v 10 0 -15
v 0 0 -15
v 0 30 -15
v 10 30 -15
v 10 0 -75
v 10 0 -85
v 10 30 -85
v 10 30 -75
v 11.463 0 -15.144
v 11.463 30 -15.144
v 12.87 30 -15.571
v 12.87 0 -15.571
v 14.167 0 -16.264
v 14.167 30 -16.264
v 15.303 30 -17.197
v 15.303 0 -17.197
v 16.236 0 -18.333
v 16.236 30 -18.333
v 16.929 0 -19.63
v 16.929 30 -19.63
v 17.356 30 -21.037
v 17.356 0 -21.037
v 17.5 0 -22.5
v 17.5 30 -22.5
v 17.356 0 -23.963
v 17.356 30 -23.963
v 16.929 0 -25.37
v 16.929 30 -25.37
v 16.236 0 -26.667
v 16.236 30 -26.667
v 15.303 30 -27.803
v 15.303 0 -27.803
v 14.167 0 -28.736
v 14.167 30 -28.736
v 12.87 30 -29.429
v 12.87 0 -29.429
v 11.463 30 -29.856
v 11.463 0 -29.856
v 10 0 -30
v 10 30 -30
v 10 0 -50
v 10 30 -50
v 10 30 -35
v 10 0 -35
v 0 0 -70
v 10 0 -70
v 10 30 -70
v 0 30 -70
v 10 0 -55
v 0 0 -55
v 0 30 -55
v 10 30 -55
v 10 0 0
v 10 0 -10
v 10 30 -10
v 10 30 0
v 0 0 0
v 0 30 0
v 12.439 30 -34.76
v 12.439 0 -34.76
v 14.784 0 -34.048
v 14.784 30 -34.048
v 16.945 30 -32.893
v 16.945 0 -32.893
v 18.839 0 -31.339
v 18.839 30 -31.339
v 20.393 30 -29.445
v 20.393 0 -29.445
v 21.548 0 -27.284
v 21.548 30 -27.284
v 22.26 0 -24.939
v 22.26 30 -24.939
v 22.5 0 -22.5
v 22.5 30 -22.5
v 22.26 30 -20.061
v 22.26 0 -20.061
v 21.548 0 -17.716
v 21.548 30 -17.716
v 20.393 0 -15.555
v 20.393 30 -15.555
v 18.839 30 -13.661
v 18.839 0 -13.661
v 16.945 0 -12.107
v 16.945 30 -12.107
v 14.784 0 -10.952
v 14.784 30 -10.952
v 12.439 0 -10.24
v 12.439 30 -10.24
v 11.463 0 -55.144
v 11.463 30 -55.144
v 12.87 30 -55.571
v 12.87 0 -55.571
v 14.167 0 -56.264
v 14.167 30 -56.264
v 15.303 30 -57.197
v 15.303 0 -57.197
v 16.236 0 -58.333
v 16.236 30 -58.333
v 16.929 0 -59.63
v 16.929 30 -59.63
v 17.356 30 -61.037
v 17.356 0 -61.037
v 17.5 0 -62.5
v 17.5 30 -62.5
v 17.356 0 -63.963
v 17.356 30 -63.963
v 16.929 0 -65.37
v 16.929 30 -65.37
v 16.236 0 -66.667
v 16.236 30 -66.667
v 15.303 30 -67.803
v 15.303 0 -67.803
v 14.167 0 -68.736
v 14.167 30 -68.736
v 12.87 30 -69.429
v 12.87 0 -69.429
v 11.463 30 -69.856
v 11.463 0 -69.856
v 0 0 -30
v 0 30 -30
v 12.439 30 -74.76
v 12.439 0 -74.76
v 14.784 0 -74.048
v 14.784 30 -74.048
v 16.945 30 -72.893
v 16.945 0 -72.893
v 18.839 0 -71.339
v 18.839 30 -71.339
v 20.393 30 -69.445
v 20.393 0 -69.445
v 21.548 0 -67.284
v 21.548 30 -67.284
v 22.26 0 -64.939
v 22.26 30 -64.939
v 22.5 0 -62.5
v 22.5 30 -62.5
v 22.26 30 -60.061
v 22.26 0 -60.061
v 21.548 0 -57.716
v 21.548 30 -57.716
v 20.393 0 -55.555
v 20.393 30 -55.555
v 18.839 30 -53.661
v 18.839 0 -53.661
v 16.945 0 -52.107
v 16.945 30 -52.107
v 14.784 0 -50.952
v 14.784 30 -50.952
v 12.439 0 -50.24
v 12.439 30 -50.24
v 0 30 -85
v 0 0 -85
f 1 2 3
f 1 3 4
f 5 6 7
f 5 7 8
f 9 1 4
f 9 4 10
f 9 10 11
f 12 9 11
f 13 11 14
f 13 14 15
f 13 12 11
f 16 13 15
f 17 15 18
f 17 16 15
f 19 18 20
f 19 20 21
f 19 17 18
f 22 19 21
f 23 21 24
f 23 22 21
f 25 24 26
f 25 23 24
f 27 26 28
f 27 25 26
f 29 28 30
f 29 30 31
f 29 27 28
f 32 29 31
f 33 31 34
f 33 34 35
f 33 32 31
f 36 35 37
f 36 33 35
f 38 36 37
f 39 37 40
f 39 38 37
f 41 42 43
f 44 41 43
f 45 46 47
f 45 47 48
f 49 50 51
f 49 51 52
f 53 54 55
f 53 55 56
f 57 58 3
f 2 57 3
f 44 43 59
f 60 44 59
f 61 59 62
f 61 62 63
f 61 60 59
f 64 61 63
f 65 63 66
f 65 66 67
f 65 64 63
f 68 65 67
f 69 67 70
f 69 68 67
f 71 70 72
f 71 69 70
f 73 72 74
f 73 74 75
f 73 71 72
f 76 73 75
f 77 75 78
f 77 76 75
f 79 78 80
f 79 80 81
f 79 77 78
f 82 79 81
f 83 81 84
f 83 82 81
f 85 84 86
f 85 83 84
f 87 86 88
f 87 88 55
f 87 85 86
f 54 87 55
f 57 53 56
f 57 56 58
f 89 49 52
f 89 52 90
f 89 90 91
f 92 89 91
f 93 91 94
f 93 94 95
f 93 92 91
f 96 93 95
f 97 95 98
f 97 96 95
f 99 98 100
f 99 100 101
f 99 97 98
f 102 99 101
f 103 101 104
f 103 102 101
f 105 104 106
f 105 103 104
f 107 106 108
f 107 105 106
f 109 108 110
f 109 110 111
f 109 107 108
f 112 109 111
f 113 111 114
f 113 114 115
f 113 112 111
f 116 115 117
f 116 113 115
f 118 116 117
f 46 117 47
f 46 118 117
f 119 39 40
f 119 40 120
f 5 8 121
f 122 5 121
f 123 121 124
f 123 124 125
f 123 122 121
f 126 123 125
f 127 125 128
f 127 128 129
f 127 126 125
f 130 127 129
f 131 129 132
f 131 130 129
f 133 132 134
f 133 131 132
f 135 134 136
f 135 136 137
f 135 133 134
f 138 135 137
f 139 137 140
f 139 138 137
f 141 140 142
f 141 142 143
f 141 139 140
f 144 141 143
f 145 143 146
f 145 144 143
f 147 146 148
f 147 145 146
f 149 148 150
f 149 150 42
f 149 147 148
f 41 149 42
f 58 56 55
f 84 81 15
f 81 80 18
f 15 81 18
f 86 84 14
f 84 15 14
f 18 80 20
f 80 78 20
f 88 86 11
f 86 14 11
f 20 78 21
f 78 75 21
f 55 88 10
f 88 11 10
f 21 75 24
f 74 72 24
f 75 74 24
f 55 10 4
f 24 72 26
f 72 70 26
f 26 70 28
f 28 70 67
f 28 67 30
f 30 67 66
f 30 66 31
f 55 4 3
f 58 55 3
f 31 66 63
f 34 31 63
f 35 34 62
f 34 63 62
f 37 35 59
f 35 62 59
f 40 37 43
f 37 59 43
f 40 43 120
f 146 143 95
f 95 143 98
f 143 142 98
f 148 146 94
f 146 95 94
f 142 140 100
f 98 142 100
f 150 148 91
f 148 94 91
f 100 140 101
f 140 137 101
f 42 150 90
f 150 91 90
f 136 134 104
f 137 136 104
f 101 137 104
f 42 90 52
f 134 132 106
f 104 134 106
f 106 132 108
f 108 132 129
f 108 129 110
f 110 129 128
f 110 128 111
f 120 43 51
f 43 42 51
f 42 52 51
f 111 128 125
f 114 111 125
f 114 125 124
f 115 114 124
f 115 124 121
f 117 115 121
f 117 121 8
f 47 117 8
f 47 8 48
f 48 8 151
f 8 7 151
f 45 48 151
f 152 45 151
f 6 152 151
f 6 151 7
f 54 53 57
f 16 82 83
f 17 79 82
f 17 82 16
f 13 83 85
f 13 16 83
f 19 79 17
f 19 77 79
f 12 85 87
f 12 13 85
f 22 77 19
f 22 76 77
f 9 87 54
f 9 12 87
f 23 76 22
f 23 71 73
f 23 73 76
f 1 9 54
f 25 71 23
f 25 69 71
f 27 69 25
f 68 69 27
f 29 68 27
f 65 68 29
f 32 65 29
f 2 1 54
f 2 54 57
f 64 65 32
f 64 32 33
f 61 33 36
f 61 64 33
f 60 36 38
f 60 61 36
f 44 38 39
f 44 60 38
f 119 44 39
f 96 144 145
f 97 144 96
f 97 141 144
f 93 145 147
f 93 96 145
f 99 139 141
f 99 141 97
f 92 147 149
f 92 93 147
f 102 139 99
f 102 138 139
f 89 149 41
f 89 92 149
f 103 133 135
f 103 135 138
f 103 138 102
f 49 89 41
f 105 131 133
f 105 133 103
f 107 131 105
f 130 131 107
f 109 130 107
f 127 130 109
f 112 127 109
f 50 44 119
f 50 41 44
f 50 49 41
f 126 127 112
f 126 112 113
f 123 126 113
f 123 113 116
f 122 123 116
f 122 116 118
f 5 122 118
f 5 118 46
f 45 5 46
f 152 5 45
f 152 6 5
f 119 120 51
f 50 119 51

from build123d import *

# Parameters (mm, degrees)
BOSS_EXTRUDE1_DEPTH = 30


with BuildPart() as part:
    # Sketch2 → Boss-Extrude1 (new body)
    with BuildSketch(Plane(origin=(0, 0, 0), x_dir=(1, 0, 0), z_dir=(0, 1, 0))):
        with BuildLine():
            Line((0, 0), (0, 15))
            Line((0, 15), (9.999999101, 15))
            ThreePointArc((9.999999101, 15), (17.5, 22.5), (9.999999101, 30))
            Line((9.999999101, 30), (0, 30))
            Line((0, 30), (0, 55))
            Line((0, 55), (9.999999101, 55))
            ThreePointArc((9.999999101, 55), (17.5, 62.5), (9.999999101, 70))
            Line((9.999999101, 70), (0, 70))
            Line((0, 70), (0, 85))
            Line((0, 85), (10, 85))
            Line((10, 85), (10, 75))
            ThreePointArc((10, 75), (22.5, 62.5), (10, 50))
            Line((10, 50), (10, 35))
            ThreePointArc((10, 35), (22.5, 22.5), (10, 10))
            Line((10, 10), (10, 0))
            Line((10, 0), (0, 0))
        make_face()
    extrude(amount=BOSS_EXTRUDE1_DEPTH)


solid = part.part
